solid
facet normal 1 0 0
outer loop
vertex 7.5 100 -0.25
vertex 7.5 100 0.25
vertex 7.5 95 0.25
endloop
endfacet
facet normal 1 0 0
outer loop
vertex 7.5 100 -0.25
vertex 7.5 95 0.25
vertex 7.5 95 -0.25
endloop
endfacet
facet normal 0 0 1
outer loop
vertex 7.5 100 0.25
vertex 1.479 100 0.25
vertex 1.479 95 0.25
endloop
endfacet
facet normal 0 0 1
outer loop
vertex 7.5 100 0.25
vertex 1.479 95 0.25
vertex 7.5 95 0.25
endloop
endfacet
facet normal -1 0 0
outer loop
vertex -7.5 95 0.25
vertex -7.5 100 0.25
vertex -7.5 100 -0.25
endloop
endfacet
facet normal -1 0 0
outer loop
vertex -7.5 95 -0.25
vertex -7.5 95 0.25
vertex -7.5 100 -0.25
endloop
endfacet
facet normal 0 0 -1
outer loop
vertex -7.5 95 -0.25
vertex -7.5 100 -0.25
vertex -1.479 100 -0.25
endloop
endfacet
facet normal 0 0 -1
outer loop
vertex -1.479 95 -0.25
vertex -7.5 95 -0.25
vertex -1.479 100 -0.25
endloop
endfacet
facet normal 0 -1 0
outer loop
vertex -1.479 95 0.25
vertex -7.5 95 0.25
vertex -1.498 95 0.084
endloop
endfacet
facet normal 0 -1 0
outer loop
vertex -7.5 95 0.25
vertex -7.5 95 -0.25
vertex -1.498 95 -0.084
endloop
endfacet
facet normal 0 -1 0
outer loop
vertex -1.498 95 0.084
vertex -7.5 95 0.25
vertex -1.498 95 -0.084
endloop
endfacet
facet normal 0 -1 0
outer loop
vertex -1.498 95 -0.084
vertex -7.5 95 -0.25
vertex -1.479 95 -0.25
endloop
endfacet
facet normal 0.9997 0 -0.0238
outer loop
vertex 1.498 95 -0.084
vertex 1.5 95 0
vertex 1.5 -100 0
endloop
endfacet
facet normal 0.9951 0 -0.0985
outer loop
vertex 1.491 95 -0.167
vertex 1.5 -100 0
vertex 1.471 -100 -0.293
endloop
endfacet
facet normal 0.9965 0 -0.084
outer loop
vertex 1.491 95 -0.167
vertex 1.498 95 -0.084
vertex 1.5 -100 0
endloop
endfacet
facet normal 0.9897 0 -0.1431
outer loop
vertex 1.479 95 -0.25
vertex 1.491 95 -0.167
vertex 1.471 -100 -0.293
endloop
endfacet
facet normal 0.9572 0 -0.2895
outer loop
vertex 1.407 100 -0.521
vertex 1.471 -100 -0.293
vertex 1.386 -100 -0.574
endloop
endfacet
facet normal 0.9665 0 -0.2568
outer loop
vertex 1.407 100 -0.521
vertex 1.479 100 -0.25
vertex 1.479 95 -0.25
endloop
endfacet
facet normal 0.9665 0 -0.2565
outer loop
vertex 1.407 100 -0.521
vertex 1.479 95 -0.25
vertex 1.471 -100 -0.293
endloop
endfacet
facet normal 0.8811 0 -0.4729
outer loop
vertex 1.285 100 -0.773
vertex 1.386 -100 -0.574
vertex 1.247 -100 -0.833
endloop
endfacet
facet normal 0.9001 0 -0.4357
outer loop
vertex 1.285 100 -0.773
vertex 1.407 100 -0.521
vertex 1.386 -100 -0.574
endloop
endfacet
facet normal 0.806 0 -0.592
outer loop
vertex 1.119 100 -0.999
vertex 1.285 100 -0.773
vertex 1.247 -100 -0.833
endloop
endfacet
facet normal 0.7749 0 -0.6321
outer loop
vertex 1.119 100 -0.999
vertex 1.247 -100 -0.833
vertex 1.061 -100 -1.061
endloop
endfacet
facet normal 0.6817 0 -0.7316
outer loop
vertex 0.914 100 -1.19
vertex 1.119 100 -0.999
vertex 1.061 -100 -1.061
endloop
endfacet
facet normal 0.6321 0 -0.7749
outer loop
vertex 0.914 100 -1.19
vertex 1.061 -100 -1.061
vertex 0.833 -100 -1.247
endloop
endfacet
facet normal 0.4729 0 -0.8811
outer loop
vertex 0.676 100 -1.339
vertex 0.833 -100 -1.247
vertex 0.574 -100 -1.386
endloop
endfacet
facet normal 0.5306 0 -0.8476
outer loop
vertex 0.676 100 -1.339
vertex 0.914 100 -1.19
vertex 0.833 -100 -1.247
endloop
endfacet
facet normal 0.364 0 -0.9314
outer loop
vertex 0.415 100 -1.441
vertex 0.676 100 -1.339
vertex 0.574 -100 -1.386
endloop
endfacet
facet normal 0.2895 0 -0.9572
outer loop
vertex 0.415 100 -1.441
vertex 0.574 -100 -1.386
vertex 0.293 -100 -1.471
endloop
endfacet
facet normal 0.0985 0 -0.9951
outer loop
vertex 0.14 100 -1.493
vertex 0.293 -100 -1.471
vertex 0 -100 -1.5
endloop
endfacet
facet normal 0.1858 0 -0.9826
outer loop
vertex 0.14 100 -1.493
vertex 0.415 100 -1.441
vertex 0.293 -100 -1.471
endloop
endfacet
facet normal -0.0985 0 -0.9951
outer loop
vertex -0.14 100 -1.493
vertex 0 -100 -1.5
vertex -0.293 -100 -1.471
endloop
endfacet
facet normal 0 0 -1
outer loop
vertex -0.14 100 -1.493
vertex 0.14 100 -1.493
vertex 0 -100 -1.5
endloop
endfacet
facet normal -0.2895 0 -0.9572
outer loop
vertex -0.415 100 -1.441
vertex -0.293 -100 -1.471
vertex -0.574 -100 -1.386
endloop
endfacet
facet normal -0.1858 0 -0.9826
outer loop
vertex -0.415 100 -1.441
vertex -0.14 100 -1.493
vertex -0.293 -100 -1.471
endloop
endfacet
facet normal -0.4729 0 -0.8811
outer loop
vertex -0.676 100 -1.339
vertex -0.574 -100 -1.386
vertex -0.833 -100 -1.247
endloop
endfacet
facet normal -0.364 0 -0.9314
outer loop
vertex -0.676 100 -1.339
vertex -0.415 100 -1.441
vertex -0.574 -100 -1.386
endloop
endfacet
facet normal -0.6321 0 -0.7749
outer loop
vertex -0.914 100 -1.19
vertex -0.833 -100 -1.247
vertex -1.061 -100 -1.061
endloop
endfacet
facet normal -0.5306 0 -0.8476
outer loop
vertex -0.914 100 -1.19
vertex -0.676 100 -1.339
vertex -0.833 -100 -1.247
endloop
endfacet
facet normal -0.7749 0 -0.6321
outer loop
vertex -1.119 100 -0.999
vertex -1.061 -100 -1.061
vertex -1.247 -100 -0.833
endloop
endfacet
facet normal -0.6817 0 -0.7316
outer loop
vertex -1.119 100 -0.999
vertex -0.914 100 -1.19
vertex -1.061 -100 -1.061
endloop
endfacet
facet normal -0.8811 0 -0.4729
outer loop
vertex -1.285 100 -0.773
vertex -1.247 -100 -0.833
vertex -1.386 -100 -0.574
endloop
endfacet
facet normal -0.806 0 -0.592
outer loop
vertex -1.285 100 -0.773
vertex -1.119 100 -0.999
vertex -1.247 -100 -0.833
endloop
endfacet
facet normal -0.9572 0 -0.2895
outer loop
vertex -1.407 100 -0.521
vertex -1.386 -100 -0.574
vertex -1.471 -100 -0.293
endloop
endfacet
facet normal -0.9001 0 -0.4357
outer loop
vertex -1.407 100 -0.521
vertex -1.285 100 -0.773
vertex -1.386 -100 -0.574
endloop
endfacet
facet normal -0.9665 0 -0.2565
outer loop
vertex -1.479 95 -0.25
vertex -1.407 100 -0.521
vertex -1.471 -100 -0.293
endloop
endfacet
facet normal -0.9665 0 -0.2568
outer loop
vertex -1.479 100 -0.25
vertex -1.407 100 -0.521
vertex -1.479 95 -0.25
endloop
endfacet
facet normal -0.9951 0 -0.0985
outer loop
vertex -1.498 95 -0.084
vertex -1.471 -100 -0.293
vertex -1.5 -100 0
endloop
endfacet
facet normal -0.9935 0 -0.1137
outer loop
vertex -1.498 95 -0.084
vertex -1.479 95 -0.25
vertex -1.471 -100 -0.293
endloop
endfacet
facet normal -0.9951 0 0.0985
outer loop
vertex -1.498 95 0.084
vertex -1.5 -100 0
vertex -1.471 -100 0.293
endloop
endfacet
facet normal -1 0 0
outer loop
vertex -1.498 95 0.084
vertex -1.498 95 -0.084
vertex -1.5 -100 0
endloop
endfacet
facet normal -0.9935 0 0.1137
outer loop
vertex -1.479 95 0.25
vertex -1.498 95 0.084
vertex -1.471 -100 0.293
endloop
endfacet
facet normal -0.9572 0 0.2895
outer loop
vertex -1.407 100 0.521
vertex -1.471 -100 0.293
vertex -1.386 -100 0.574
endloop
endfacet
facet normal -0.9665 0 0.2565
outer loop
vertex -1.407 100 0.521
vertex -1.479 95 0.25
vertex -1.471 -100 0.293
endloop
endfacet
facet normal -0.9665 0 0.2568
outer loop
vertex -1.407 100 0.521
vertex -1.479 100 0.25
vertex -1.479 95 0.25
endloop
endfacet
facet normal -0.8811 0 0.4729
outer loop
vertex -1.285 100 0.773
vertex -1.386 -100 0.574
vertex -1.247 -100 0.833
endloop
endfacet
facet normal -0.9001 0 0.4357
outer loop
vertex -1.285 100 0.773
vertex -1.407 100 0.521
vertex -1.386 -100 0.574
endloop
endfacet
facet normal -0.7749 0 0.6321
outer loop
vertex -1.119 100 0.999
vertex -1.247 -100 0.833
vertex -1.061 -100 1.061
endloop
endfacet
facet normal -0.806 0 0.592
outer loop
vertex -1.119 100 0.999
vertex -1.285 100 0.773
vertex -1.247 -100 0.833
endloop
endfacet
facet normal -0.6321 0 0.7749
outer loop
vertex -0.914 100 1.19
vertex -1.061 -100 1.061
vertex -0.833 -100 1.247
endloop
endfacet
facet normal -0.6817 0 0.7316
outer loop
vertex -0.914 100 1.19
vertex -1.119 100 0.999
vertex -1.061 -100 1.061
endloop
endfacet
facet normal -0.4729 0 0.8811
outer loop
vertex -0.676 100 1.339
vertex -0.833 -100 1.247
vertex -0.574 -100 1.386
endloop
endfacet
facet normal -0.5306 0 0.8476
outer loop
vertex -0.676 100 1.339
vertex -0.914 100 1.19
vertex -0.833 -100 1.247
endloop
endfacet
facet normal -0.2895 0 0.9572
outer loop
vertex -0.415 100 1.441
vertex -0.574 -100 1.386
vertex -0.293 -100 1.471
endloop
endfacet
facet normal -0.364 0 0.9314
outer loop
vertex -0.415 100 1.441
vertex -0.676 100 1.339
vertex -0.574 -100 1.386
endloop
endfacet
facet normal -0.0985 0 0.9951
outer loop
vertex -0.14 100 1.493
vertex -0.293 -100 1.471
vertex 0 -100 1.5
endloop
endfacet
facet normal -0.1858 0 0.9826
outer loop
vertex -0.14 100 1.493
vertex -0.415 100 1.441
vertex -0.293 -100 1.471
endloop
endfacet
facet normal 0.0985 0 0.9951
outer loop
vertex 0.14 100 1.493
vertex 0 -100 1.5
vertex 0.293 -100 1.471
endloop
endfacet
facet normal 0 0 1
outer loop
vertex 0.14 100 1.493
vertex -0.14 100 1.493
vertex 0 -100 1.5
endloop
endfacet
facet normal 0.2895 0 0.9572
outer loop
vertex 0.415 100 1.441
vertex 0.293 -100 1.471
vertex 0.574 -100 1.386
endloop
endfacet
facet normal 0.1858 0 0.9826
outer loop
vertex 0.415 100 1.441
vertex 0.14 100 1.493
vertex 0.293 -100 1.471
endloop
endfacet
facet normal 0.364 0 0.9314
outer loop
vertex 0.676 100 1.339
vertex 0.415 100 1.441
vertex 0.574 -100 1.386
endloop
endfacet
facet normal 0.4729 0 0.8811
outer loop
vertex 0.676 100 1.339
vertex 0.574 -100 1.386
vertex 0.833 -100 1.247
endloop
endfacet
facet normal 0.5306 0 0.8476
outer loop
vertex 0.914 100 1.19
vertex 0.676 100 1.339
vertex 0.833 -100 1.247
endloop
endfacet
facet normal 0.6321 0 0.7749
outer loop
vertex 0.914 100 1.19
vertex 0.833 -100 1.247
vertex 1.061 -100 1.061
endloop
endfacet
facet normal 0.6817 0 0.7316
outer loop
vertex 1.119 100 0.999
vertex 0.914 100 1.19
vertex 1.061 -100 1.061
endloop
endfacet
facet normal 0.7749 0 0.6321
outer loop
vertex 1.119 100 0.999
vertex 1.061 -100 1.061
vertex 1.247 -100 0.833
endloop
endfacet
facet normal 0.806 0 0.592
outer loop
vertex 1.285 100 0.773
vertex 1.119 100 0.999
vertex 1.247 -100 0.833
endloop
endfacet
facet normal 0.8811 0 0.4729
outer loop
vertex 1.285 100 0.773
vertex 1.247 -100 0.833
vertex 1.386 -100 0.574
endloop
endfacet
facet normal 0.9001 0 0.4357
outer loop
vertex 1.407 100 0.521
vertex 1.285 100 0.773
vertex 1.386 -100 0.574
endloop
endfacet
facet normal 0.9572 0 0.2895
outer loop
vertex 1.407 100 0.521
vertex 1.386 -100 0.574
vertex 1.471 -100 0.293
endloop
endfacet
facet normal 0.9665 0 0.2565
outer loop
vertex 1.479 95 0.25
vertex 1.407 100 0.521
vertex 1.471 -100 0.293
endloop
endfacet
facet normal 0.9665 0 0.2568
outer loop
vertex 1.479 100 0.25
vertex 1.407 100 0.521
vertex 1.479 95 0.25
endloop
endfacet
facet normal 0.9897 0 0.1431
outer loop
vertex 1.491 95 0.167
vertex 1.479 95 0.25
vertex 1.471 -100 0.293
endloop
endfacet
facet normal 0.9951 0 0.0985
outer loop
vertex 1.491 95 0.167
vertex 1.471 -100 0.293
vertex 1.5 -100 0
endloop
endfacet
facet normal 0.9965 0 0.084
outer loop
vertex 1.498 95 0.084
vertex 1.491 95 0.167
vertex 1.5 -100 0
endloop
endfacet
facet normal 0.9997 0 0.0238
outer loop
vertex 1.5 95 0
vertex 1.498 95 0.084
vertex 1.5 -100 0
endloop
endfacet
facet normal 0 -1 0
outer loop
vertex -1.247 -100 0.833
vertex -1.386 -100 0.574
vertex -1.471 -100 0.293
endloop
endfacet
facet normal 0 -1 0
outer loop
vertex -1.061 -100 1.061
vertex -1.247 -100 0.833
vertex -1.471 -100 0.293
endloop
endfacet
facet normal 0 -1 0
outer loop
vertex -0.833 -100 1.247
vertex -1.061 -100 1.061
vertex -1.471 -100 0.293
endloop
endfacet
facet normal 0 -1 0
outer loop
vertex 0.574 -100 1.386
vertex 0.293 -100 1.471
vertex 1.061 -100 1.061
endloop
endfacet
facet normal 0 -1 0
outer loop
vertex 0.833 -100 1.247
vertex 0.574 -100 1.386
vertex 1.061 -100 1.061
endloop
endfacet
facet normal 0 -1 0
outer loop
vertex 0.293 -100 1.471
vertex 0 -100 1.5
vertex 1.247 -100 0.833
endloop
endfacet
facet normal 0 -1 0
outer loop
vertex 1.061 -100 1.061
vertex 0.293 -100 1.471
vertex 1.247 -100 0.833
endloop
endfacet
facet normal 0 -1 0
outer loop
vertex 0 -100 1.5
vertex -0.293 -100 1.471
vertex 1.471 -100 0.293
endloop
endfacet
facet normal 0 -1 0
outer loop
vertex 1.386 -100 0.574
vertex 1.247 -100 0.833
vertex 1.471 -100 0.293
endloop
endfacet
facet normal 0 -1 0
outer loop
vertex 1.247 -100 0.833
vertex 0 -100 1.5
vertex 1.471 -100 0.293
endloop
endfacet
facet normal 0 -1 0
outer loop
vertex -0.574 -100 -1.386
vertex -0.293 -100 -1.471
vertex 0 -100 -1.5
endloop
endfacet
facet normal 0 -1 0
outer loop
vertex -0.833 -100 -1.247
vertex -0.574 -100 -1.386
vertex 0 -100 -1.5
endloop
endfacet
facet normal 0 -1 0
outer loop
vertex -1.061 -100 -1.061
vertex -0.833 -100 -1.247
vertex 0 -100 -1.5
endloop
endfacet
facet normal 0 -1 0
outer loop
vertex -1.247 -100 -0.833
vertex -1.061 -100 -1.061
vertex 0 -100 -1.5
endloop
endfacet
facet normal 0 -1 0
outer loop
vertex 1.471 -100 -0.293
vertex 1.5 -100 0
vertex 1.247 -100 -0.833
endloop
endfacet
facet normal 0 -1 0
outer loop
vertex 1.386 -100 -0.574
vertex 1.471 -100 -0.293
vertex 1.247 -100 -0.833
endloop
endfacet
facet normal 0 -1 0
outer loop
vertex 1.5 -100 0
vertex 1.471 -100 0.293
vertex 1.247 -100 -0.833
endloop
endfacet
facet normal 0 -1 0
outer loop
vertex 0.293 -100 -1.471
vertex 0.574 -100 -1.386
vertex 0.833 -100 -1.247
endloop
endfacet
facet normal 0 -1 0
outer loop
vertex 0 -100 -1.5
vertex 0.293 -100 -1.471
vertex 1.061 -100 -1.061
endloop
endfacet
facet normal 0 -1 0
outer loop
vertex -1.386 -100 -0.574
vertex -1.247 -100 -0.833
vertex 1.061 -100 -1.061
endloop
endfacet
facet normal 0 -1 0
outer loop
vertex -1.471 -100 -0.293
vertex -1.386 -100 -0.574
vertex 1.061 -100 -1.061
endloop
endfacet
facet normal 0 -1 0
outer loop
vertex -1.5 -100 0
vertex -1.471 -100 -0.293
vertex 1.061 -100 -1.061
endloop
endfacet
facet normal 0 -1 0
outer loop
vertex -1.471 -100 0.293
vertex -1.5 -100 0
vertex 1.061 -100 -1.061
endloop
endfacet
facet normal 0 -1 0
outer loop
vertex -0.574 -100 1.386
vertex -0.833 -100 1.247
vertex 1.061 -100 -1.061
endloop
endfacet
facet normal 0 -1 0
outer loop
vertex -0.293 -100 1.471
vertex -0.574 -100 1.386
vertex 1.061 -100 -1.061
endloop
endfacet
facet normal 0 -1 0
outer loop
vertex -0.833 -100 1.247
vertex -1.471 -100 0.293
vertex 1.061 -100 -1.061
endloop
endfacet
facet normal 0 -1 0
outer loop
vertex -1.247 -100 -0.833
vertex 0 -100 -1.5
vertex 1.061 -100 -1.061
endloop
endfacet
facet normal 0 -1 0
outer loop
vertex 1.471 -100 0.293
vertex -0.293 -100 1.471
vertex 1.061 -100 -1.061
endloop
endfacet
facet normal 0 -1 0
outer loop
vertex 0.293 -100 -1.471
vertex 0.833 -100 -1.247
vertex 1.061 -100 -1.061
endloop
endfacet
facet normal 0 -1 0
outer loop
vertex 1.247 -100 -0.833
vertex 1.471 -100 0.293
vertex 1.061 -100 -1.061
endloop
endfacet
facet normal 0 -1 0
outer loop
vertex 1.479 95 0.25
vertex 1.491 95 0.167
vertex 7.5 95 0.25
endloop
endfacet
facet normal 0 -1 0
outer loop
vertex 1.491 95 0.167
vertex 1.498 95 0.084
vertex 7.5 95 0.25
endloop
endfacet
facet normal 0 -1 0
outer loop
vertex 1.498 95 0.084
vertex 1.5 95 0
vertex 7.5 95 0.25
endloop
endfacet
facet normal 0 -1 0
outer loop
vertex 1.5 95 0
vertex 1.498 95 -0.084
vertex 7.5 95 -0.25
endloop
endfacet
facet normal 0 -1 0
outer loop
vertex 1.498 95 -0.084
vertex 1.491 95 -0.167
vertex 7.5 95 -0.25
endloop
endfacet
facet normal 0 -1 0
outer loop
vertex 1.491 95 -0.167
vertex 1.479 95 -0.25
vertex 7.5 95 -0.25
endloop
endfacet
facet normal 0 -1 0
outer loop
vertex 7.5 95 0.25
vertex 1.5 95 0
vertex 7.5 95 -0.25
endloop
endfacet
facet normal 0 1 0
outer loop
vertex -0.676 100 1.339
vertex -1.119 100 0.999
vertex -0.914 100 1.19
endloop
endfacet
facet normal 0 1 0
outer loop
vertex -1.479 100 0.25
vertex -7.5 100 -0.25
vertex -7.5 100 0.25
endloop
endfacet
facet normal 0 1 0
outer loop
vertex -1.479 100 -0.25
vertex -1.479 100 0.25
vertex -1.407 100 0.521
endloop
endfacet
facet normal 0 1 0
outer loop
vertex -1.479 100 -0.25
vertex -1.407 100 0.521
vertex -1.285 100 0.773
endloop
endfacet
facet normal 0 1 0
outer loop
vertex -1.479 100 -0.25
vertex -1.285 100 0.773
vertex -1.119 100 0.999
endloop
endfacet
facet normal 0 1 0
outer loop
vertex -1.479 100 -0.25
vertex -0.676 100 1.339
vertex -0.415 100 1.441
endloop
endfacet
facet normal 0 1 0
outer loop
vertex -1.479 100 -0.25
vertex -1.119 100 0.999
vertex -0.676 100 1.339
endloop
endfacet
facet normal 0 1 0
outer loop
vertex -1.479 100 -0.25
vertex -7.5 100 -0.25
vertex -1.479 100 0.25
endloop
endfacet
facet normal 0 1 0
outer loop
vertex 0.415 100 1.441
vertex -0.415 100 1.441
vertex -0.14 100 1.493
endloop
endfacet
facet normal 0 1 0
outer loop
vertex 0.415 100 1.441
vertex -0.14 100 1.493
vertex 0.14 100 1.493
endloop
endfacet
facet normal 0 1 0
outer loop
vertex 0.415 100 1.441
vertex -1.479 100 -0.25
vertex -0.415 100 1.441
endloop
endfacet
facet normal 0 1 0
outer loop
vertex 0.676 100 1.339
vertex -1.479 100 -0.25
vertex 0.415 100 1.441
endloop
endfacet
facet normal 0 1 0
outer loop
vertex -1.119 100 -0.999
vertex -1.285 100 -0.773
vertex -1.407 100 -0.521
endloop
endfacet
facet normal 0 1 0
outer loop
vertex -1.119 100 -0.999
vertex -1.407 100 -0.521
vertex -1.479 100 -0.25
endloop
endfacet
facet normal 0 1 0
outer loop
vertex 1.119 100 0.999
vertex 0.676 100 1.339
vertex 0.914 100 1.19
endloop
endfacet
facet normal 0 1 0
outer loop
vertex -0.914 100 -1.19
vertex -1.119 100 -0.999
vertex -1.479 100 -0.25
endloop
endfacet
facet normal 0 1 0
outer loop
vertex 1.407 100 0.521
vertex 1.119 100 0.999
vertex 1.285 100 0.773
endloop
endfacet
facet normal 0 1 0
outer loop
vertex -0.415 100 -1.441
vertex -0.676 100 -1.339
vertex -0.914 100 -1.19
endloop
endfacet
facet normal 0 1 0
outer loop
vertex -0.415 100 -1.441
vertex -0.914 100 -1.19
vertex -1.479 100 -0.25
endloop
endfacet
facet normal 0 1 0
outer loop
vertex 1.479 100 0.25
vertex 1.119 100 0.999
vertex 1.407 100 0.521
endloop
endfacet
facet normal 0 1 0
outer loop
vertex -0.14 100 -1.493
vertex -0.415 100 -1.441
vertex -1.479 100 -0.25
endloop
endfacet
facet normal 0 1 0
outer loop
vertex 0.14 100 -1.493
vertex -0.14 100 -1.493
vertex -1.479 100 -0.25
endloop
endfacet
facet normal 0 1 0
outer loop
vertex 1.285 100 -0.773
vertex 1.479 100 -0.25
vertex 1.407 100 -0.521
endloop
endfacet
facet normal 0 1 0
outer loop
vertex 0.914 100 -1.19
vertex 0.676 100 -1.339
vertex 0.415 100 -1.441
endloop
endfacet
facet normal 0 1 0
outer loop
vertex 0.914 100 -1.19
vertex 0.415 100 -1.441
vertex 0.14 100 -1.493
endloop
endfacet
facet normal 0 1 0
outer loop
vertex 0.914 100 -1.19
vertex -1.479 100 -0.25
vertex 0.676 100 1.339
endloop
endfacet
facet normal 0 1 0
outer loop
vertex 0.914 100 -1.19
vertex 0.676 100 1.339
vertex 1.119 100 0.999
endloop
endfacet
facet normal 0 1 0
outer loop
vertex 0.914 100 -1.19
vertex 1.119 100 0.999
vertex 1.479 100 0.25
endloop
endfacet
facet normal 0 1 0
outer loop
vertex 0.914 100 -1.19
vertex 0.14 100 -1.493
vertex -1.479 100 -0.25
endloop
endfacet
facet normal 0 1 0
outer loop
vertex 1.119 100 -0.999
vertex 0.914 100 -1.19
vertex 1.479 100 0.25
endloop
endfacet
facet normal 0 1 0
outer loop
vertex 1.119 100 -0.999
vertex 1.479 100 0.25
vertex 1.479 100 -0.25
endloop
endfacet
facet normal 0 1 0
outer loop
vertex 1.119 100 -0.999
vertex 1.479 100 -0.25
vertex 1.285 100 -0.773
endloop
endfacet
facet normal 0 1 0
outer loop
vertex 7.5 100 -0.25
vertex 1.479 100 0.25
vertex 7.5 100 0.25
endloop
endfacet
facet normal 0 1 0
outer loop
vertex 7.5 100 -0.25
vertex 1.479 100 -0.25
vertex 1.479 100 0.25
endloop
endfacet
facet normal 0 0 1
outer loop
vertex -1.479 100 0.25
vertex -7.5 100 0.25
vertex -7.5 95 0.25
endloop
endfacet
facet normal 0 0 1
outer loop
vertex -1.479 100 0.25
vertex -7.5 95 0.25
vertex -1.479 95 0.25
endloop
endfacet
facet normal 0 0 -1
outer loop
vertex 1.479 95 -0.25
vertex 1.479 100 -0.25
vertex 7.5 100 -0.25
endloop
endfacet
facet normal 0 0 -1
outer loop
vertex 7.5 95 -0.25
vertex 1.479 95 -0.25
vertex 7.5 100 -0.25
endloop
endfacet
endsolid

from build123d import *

# Parameters (mm, degrees)
SKETCH1_R           = 1.5
BOSS_EXTRUDE1_DEPTH = 100
SKETCH2_W           = 15
SKETCH2_H           = 0.5
BOSS_EXTRUDE2_DEPTH = 5


with BuildPart() as part:
    # Sketch1 → Boss-Extrude1 (new body, symmetric)
    with BuildSketch(Plane(origin=(0, 0, 0), x_dir=(1, 0, 0), z_dir=(0, 1, 0))):
        Circle(SKETCH1_R)
    extrude(amount=BOSS_EXTRUDE1_DEPTH, both=True)

    # Sketch2 → Boss-Extrude2 (add)
    with BuildSketch(Plane(origin=(0, 100, 0), x_dir=(1, 0, 0), z_dir=(0, 1, 0))):
        Rectangle(SKETCH2_W, SKETCH2_H)
    extrude(amount=-BOSS_EXTRUDE2_DEPTH)


solid = part.part
